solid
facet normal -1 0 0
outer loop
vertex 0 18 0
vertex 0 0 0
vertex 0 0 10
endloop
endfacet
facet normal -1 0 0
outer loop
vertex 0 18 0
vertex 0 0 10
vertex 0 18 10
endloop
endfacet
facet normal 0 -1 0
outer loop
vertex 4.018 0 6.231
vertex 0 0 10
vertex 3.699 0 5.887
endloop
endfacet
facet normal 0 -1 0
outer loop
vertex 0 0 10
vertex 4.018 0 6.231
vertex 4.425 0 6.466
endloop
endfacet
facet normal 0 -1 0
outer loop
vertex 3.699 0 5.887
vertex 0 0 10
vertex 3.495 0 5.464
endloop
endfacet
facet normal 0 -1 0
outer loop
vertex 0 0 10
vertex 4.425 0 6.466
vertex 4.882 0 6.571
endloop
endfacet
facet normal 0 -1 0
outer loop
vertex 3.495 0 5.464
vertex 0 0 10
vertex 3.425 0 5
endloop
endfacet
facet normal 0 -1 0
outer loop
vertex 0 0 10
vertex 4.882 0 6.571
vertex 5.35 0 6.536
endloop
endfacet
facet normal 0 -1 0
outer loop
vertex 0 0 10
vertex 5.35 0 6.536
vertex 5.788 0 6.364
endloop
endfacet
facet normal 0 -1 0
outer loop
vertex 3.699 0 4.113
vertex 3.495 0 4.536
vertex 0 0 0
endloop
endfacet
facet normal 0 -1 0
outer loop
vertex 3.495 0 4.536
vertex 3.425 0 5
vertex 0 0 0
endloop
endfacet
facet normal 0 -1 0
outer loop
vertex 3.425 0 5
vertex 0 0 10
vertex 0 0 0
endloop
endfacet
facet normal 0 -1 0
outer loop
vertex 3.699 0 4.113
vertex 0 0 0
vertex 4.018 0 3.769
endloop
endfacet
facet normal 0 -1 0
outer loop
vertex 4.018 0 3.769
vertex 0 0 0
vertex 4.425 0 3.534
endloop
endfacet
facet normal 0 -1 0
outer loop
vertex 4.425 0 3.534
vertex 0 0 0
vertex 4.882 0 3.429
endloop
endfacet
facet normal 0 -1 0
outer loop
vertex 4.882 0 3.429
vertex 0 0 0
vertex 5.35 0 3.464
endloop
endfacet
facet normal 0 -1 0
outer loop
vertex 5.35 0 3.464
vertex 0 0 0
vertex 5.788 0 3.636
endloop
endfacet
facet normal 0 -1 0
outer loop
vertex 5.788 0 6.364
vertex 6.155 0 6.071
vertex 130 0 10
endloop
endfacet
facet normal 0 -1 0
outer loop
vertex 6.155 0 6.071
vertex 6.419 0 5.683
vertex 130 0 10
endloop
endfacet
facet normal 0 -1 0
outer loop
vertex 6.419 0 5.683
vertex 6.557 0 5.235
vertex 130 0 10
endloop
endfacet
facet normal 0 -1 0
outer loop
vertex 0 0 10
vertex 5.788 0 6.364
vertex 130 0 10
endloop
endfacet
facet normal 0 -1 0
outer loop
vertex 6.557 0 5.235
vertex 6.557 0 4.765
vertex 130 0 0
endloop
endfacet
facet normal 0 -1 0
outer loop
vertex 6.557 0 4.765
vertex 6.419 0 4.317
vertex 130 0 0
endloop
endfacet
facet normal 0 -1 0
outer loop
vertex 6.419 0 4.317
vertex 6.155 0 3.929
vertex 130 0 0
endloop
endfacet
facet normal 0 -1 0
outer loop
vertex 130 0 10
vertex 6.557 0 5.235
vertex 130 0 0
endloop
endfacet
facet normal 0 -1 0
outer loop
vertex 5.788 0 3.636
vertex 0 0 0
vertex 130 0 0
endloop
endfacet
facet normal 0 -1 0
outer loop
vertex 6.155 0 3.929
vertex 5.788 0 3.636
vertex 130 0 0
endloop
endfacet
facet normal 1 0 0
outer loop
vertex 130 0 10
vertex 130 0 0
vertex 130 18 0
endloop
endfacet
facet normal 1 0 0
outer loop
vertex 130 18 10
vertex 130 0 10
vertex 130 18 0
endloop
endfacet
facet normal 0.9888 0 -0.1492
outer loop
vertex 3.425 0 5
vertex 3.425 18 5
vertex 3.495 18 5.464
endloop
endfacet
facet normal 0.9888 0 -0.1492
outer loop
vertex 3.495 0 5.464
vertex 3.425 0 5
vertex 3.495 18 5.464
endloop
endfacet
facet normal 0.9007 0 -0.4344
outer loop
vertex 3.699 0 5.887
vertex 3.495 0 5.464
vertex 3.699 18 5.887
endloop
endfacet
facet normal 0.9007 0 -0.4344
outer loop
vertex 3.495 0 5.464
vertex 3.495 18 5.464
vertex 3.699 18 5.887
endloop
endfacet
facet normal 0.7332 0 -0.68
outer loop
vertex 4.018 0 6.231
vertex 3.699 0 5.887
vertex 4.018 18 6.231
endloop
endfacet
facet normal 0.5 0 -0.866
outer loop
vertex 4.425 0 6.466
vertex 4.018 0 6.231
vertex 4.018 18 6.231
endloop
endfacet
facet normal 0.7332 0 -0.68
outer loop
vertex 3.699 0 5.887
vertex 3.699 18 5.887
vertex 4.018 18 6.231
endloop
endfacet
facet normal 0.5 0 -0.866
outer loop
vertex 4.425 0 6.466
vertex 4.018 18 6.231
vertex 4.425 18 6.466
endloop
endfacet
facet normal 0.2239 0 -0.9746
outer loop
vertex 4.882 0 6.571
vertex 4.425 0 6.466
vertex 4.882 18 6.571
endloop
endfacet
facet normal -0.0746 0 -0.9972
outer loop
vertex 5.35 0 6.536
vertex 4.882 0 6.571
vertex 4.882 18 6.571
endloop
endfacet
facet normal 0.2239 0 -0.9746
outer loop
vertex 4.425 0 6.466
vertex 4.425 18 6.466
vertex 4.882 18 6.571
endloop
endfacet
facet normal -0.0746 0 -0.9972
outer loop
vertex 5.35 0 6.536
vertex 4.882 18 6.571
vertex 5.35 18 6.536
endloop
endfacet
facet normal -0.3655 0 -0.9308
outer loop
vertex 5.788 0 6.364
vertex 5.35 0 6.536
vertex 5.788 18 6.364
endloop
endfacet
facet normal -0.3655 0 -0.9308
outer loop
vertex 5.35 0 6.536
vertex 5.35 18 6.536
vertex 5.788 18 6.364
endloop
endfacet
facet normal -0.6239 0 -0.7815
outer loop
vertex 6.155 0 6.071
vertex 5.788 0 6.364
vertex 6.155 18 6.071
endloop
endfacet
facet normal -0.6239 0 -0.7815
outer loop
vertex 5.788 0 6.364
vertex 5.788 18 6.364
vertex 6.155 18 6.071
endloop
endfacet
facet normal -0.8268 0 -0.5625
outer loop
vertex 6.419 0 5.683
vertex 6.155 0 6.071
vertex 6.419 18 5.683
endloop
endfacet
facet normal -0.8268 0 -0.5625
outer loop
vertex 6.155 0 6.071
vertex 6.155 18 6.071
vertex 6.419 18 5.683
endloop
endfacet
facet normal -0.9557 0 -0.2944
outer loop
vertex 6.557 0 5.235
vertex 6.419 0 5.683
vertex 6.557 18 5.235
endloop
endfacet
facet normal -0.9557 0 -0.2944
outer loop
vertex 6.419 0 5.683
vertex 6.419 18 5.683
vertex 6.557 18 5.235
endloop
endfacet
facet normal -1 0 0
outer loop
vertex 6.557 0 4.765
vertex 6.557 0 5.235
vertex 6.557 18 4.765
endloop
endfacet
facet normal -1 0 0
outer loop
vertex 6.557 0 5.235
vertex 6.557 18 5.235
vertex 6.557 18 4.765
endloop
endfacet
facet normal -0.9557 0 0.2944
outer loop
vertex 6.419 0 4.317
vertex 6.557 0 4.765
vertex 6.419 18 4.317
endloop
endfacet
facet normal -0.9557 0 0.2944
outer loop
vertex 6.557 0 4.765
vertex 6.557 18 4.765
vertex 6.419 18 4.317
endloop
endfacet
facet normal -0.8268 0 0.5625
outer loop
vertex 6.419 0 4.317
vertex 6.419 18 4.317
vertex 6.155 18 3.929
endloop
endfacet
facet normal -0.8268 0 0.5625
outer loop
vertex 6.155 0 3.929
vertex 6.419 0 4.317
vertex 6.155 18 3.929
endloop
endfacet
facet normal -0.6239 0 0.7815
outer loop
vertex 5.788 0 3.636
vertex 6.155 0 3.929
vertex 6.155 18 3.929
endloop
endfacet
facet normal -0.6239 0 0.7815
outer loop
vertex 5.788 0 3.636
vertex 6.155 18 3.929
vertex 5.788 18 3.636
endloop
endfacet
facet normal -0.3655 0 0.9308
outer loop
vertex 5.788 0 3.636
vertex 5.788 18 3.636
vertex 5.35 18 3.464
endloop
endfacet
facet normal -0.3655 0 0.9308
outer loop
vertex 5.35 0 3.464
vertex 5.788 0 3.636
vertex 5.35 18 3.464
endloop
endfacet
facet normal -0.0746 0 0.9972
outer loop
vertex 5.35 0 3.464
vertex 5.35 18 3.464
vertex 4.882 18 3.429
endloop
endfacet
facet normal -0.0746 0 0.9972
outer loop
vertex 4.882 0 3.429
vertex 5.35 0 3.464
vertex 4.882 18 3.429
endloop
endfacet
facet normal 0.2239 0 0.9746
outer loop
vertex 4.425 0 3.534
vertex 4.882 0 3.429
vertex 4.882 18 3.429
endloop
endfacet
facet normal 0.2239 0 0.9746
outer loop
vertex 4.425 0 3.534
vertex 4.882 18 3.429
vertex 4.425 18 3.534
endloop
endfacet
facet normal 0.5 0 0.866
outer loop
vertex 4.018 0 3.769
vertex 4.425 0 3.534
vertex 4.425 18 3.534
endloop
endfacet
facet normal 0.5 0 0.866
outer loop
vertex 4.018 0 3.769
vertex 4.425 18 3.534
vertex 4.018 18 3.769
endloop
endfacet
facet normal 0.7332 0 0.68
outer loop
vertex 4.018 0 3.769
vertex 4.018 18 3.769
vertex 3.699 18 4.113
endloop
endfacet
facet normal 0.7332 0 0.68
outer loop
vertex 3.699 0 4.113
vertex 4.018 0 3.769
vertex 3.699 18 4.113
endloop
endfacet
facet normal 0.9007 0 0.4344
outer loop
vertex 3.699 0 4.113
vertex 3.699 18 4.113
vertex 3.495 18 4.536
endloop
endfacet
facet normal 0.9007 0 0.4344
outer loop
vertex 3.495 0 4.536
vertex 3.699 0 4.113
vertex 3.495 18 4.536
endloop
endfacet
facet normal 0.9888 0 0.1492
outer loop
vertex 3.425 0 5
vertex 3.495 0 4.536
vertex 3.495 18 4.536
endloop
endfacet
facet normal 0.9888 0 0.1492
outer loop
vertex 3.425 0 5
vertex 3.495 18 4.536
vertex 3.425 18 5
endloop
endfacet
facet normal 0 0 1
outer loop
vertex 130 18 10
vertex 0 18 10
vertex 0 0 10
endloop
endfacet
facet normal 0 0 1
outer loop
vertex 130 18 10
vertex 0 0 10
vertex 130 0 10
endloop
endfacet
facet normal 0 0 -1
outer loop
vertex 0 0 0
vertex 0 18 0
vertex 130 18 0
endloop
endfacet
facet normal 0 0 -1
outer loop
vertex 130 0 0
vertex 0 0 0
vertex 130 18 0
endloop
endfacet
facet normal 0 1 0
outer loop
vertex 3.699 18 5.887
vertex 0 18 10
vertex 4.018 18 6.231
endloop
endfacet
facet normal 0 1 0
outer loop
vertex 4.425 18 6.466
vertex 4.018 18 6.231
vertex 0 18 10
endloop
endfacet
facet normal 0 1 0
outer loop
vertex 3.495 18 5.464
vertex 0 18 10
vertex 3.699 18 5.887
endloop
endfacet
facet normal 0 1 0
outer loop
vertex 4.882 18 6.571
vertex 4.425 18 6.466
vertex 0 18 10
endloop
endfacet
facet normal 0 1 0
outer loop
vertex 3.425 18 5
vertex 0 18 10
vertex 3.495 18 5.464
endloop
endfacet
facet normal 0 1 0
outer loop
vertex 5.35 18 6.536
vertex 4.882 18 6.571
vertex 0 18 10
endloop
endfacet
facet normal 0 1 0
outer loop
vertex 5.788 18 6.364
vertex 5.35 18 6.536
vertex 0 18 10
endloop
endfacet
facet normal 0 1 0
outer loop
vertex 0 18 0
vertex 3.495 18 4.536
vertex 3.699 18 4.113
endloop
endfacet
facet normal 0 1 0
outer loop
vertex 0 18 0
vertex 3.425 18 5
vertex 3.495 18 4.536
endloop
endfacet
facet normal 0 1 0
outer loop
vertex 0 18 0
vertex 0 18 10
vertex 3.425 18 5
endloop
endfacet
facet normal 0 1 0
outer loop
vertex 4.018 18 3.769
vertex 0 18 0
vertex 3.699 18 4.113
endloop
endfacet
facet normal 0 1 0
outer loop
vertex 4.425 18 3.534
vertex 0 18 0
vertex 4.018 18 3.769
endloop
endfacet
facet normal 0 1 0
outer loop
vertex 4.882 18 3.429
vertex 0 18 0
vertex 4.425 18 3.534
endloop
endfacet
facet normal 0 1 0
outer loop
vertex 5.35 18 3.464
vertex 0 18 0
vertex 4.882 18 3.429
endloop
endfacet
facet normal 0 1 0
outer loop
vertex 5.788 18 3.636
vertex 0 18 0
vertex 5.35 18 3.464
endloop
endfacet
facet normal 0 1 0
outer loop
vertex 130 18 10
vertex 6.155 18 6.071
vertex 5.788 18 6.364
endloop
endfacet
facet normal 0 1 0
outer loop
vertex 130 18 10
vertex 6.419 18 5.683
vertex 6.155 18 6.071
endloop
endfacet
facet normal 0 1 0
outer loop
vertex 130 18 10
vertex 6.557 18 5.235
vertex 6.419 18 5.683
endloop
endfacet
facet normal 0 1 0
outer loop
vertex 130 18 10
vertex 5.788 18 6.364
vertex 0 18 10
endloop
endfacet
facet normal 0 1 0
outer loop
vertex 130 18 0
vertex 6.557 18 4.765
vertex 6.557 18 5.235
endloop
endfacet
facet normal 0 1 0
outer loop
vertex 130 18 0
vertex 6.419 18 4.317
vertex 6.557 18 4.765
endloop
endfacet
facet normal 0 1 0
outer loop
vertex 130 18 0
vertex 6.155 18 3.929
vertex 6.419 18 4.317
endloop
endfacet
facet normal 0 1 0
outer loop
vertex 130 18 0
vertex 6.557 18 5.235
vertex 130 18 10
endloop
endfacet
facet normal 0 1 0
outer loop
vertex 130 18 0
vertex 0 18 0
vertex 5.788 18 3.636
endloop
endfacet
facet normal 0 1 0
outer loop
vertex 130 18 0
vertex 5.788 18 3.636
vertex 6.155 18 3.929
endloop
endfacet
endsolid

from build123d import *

# Parameters (mm, degrees)
F0_W     = 130
F0_H     = 18
F1_DEPTH = 10
F3_D     = 3.15


with BuildPart() as f1:
    # F0 (on Top) → F1 (new body)
    with BuildSketch(Plane.XY):
        with Locations((65, 9)):
            Rectangle(F0_W, F0_H)
    extrude(amount=F1_DEPTH)

    # F3 (through all)
    with Locations(Plane.XZ):
        with Locations((5, 5)):
            Hole(F3_D / 2)


solid = f1.part
